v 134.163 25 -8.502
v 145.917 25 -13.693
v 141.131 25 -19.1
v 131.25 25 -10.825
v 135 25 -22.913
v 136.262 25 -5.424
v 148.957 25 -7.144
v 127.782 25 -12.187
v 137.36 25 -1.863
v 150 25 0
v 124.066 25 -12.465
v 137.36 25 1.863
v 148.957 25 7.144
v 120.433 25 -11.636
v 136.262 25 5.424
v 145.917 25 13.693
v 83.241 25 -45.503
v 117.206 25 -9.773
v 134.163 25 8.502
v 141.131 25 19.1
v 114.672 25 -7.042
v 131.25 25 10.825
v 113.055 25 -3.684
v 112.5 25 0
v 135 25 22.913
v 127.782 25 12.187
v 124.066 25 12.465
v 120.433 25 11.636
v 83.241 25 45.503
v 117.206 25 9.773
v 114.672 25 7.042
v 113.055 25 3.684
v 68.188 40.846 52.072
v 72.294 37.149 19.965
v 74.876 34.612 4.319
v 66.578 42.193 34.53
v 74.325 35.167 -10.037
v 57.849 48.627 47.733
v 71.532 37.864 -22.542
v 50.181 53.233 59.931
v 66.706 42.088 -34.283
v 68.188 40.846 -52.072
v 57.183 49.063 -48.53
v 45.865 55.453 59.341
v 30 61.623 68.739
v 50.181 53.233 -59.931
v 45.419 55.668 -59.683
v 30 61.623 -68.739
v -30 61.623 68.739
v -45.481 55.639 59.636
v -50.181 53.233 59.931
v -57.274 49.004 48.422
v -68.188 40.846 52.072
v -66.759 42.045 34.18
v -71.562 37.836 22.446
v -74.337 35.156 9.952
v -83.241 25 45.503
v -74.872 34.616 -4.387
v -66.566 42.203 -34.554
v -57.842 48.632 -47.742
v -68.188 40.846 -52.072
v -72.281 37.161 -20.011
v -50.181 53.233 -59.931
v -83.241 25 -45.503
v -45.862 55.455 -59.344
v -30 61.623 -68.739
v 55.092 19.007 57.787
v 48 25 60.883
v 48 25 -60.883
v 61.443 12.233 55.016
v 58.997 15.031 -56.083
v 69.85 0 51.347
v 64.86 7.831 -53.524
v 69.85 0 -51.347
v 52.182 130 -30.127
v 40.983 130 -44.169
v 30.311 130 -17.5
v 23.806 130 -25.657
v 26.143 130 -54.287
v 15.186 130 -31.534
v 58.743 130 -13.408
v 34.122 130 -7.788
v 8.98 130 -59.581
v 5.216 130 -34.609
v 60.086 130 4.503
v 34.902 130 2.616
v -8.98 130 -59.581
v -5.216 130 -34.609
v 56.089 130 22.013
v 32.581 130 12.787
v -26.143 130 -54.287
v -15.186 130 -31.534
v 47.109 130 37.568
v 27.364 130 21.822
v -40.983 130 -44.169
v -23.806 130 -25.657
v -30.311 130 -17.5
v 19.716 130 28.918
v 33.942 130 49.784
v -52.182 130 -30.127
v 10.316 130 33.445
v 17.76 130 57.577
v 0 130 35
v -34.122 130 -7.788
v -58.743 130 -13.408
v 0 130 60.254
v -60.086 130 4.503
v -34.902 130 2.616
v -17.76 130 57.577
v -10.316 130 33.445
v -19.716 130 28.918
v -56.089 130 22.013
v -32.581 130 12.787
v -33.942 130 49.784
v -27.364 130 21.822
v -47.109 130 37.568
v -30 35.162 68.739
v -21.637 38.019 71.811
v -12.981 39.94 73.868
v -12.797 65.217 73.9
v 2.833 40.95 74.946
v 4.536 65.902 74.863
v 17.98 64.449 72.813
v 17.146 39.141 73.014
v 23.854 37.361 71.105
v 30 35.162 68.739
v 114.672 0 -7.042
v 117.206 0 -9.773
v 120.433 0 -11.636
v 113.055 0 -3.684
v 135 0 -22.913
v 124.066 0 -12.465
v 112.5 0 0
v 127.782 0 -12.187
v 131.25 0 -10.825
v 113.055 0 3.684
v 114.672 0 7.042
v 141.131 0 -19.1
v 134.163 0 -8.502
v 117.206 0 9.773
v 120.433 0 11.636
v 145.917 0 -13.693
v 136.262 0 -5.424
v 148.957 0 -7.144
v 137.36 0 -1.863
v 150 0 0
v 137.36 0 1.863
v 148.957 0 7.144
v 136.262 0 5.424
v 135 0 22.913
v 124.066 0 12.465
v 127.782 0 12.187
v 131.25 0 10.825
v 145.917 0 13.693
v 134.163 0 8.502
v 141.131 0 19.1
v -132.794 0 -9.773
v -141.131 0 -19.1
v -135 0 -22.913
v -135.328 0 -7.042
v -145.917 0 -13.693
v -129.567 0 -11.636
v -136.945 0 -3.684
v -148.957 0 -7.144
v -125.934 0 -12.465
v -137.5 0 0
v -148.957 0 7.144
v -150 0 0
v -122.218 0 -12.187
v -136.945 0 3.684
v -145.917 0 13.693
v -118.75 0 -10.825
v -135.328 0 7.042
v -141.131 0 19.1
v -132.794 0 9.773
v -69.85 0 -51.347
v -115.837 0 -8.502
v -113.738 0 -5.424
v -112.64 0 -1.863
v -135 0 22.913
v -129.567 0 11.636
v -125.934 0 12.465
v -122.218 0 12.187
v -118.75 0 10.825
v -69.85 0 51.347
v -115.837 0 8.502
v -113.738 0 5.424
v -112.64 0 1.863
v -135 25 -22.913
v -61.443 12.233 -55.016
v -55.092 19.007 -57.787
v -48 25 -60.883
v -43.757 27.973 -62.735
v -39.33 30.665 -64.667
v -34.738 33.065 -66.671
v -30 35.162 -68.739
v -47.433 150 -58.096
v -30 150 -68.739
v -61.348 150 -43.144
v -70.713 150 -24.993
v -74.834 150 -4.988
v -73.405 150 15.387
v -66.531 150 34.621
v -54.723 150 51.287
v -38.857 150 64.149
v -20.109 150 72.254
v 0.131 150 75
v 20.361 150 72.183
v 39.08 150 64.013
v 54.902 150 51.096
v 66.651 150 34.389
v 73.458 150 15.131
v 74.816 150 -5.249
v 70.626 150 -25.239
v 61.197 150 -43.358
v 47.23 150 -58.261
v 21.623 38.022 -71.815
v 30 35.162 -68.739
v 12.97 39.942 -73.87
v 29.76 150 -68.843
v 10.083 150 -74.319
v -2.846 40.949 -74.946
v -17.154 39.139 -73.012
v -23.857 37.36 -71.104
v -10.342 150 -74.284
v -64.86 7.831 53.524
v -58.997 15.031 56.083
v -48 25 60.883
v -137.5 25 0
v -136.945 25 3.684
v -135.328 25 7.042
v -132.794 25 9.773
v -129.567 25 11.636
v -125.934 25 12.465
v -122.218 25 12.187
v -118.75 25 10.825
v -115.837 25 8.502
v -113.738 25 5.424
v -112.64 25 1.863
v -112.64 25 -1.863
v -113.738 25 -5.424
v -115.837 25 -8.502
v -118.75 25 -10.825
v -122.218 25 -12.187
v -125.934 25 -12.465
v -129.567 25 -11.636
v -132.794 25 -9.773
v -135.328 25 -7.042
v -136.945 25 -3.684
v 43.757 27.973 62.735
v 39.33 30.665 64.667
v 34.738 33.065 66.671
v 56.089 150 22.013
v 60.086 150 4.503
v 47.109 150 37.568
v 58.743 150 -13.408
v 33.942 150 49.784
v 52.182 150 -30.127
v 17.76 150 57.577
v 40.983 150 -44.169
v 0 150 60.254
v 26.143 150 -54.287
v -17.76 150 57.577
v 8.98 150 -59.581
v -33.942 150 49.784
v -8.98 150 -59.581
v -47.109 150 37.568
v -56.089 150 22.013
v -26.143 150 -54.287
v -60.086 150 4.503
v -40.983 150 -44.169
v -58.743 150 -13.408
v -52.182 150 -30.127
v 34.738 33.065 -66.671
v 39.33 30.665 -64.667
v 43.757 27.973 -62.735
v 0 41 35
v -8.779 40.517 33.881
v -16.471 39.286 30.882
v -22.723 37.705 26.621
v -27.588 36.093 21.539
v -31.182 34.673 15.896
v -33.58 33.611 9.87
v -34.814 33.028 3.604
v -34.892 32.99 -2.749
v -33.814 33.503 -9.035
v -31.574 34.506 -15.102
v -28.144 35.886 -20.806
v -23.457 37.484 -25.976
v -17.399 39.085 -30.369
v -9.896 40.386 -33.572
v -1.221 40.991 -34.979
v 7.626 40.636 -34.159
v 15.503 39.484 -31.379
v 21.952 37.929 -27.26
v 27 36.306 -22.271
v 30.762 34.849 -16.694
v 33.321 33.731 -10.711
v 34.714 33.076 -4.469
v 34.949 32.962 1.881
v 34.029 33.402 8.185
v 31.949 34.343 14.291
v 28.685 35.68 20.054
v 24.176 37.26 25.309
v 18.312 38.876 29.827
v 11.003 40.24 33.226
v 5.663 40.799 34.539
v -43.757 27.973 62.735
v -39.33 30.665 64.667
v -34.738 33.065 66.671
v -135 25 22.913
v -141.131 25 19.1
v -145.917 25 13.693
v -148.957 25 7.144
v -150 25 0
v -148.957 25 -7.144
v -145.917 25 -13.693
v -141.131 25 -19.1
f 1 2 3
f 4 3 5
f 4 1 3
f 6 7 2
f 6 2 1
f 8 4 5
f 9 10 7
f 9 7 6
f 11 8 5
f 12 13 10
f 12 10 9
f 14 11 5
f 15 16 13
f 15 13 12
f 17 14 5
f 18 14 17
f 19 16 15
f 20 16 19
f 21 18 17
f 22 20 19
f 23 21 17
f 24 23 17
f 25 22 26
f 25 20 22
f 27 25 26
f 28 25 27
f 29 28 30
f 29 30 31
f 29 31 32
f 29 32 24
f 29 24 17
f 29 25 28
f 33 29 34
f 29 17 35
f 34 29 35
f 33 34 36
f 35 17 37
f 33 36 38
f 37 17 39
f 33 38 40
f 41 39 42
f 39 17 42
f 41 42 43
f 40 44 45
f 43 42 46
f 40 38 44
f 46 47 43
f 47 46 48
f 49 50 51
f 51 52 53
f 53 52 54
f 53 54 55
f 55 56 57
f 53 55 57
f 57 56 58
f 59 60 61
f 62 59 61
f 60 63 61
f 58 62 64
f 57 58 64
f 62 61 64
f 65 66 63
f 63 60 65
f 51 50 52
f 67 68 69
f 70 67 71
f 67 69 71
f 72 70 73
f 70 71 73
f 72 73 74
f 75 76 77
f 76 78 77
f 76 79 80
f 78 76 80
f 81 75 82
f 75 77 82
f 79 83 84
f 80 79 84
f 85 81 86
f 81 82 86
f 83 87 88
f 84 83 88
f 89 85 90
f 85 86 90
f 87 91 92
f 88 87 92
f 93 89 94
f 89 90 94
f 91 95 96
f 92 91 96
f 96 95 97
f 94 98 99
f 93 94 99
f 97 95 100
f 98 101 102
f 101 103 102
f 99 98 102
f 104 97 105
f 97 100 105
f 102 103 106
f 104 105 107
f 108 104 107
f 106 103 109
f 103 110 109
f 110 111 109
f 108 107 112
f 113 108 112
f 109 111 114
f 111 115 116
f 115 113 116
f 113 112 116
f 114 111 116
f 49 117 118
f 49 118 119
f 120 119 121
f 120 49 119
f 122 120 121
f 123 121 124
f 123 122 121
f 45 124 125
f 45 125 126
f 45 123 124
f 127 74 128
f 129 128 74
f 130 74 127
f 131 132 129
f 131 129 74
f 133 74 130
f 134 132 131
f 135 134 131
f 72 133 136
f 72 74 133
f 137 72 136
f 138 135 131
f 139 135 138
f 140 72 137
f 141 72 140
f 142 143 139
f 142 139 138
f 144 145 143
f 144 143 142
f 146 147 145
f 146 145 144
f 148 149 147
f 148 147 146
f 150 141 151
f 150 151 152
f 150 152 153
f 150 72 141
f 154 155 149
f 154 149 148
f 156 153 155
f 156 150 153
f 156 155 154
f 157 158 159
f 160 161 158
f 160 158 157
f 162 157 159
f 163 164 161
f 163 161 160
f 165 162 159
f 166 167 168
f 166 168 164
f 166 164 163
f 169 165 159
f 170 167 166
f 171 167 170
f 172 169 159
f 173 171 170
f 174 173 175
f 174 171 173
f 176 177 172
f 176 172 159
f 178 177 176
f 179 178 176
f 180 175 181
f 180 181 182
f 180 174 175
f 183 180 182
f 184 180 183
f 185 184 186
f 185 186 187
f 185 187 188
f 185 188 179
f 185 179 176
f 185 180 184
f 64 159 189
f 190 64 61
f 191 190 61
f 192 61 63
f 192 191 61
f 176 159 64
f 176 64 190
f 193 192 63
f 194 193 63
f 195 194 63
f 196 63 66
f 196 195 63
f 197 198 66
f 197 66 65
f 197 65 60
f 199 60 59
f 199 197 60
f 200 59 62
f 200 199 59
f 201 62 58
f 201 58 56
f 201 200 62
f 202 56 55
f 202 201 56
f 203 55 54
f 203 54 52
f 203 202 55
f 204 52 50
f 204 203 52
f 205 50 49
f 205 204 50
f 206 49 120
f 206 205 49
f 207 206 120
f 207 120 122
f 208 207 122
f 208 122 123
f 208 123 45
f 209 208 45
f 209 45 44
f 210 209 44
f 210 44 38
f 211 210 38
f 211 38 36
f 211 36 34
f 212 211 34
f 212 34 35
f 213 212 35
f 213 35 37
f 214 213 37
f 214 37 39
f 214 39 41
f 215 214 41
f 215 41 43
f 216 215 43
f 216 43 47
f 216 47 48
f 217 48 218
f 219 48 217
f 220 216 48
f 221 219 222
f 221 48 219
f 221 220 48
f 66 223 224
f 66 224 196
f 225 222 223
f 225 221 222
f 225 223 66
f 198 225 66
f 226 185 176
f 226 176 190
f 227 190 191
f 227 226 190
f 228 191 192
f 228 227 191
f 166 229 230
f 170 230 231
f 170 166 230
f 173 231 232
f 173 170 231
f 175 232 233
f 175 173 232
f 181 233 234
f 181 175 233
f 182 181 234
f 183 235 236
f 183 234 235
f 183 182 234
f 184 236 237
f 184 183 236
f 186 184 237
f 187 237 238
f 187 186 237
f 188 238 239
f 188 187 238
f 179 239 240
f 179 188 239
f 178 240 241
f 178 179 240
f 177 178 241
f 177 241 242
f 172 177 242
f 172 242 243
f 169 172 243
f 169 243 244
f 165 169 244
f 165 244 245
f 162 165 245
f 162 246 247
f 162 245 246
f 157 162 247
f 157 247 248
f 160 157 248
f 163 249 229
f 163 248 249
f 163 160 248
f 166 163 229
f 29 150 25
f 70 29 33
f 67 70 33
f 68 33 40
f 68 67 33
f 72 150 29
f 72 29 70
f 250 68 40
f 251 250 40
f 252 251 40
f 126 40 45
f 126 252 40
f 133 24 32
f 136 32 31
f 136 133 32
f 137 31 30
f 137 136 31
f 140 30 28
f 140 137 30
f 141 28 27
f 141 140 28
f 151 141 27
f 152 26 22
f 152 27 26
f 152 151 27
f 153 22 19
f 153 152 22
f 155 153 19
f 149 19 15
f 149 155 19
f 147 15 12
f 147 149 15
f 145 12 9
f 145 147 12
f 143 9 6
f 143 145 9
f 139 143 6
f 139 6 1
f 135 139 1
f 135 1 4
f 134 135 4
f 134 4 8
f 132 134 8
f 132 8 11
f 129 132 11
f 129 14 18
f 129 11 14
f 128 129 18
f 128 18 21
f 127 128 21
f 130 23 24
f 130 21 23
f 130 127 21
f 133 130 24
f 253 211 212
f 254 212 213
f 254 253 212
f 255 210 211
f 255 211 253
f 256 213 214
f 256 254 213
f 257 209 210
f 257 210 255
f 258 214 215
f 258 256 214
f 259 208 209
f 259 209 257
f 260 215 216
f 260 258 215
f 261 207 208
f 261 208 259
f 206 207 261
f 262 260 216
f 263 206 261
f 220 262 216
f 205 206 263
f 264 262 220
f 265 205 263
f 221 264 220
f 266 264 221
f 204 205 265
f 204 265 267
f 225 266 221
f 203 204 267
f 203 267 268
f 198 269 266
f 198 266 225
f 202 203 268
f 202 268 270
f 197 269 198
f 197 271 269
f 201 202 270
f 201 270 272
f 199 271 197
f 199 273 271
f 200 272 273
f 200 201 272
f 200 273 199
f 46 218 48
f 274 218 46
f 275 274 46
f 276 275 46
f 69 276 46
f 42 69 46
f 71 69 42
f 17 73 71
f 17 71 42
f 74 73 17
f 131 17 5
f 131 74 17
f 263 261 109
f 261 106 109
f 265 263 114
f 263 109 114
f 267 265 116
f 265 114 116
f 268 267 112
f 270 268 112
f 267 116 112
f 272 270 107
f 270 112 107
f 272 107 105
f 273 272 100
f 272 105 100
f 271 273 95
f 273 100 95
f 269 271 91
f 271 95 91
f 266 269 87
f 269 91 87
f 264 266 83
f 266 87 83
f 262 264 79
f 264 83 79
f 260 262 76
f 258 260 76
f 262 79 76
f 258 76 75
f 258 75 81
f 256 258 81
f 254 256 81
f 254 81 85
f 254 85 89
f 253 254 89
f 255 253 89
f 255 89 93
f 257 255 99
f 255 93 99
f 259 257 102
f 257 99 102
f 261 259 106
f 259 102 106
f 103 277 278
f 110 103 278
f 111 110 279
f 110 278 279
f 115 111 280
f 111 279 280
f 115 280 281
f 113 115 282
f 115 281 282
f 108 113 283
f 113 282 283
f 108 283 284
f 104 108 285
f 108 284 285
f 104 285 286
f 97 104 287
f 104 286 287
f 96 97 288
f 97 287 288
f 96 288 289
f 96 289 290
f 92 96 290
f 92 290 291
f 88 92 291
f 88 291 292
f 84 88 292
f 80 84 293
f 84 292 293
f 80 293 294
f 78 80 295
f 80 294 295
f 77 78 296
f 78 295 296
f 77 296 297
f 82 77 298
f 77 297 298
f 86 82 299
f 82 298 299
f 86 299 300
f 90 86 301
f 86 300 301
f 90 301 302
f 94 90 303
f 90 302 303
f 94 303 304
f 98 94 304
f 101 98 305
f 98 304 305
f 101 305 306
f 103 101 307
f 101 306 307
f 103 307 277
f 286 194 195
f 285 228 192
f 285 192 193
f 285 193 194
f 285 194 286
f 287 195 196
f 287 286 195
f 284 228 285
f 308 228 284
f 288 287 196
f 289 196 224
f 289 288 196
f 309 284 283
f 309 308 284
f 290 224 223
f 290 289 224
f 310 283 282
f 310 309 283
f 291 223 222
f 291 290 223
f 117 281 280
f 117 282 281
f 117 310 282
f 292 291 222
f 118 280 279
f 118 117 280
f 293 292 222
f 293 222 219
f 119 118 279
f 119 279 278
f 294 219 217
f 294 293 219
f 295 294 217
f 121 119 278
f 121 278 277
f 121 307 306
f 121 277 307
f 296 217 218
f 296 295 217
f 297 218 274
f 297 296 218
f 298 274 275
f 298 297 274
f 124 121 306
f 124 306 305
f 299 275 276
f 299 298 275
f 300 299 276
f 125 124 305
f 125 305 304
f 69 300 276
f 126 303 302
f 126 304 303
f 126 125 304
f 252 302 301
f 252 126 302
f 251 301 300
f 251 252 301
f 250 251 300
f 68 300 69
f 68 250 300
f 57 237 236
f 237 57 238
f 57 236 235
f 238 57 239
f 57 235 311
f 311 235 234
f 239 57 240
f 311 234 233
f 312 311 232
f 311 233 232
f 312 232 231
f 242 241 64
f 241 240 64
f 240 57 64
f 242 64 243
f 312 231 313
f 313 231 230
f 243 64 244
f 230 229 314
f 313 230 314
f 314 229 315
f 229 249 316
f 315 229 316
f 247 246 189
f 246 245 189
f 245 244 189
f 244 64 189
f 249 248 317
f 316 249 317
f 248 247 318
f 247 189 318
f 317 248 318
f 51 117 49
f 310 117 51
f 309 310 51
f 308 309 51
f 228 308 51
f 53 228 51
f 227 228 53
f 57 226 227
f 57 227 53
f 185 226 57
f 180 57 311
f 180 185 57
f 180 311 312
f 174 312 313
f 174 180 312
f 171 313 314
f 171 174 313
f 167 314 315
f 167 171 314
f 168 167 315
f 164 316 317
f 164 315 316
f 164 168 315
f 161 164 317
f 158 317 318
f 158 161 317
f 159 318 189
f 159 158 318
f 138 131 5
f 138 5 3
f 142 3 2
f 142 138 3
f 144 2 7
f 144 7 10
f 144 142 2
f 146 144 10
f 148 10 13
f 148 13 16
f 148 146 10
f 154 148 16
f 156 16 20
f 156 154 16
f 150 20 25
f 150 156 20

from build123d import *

# Parameters (mm, degrees)
BOSS_EXTRUDE2_DEPTH = 75
SKETCH2_OUTSIDE_W   = 370.368
SKETCH2_OUTSIDE_H   = 220.368
SKETCH2_OUTSIDE_R   = 12.5
CUT_EXTRUDE3_DEPTH  = 150
BOSS_EXTRUDE3_REACH = 227
SKETCH3_R           = 75


with BuildPart() as part:
    # Sketch1 → Boss-Extrude2 (new, symmetric)
    with BuildSketch(Plane.XY):
        with BuildLine():
            Line((150, 25), (83.240615087, 25))
            ThreePointArc((83.240615087, 25), (91.224995055, 12.990386393), (97.488460856, 0))
            Line((97.488460856, 0), (150, 0))
            Line((150, 0), (150, 25))
        make_face()
        with BuildLine():
            Line((-48, 25), (-83.240615087, 25))
            ThreePointArc((-83.240615087, 25), (-91.224995055, 12.990386393), (-97.488460856, 0))
            Line((-97.488460856, 0), (-69.84983894, 0))
            ThreePointArc((-69.84983894, 0), (-60.236169654, 13.646024213), (-48, 25))
        make_face()
        with BuildLine():
            ThreePointArc((97.488460856, 0), (91.224995055, 12.990386393), (83.240615087, 25))
            Line((83.240615087, 25), (48, 25))
            ThreePointArc((48, 25), (60.236169654, 13.646024213), (69.84983894, 0))
            Line((69.84983894, 0), (97.488460856, 0))
        make_face()
        with BuildLine():
            ThreePointArc((83.240615087, 25), (0, 66), (-83.240615087, 25))
            Line((-83.240615087, 25), (-48, 25))
            ThreePointArc((-48, 25), (0, 41), (48, 25))
            Line((48, 25), (83.240615087, 25))
        make_face()
        with BuildLine():
            Line((-48, 25), (-83.240615087, 25))
            ThreePointArc((-83.240615087, 25), (-91.224995055, 12.990386393), (-97.488460856, 0))
            Line((-97.488460856, 0), (-69.84983894, 0))
            ThreePointArc((-69.84983894, 0), (-60.236169654, 13.646024213), (-48, 25))
        make_face()
        with BuildLine():
            ThreePointArc((97.488460856, 0), (91.224995055, 12.990386393), (83.240615087, 25))
            Line((83.240615087, 25), (48, 25))
            ThreePointArc((48, 25), (60.236169654, 13.646024213), (69.84983894, 0))
            Line((69.84983894, 0), (97.488460856, 0))
        make_face()
        with BuildLine():
            Line((-83.240615087, 25), (-150, 25))
            Line((-150, 25), (-150, 0))
            Line((-150, 0), (-97.488460856, 0))
            ThreePointArc((-97.488460856, 0), (-91.224995055, 12.990386393), (-83.240615087, 25))
        make_face()
    extrude(amount=BOSS_EXTRUDE2_DEPTH, both=True)

    # Sketch2 outside → Cut-Extrude3 (cut)
    # profile 1 of 3: a face of its own
    with BuildSketch(Plane(origin=(0, 0, 0), x_dir=(1, 0, 0), z_dir=(0, 1, 0))):
        Rectangle(SKETCH2_OUTSIDE_W, SKETCH2_OUTSIDE_H)
        with BuildLine():
            Line((135, -22.912878475), (30, -68.738635424))
            ThreePointArc((30, -68.738635424), (0, -75), (-30, -68.738635424))
            Line((-30, -68.738635424), (-135, -22.912878475))
            ThreePointArc((-135, -22.912878475), (-150, 0), (-135, 22.912878475))
            Line((-135, 22.912878475), (-30, 68.738635424))
            ThreePointArc((-30, 68.738635424), (0, 75), (30, 68.738635424))
            Line((30, 68.738635424), (135, 22.912878475))
            ThreePointArc((135, 22.912878475), (150, 0), (135, -22.912878475))
        make_face(mode=Mode.SUBTRACT)
    # profile 2 of 3: a face of its own
    with BuildSketch(Plane(origin=(0, 0, 0), x_dir=(1, 0, 0), z_dir=(0, 1, 0))):
        with Locations(Location((125, 0, 0), (0, 0, 180))):
            Circle(SKETCH2_OUTSIDE_R)
    # profile 3 of 3: a face of its own
    with BuildSketch(Plane(origin=(0, 0, 0), x_dir=(1, 0, 0), z_dir=(0, 1, 0))):
        with Locations(Location((-125, 0, 0), (0, 0, 180))):
            Circle(SKETCH2_OUTSIDE_R)
    extrude(amount=CUT_EXTRUDE3_DEPTH, mode=Mode.SUBTRACT)

    # Sketch3 → Boss-Extrude3 (add, up to next)
    with BuildSketch(Plane(origin=(0, 150, 0), x_dir=(1, 0, 0), z_dir=(0, 1, 0)), mode=Mode.PRIVATE) as boss_extrude3_sk1:
        with Locations(Location((0, 0, 0), (0, 0, 113.578178478))):
            Circle(SKETCH3_R)
    boss_extrude3_tool1 = extrude(boss_extrude3_sk1.sketch, amount=-BOSS_EXTRUDE3_REACH, mode=Mode.PRIVATE) - part.part
    add(boss_extrude3_tool1.solids().sort_by_distance((0, 150, 0))[0])

    # Sketch5 → Cut-Revolve3 (revolve, cut)
    with BuildSketch(Plane.XY, mode=Mode.PRIVATE) as cut_revolve3_sk:
        Polygon((0, 150), (60.25406126, 150), (60.25406126, 130), (35, 130), (35, 0), (0, 0), align=None)
    revolve(cut_revolve3_sk.sketch.rotate(Axis((0, 0, 0), (0, -1, 0)), 90), axis=Axis((0, 0, 0), (0, -1, 0)), mode=Mode.SUBTRACT)


solid = part.part
